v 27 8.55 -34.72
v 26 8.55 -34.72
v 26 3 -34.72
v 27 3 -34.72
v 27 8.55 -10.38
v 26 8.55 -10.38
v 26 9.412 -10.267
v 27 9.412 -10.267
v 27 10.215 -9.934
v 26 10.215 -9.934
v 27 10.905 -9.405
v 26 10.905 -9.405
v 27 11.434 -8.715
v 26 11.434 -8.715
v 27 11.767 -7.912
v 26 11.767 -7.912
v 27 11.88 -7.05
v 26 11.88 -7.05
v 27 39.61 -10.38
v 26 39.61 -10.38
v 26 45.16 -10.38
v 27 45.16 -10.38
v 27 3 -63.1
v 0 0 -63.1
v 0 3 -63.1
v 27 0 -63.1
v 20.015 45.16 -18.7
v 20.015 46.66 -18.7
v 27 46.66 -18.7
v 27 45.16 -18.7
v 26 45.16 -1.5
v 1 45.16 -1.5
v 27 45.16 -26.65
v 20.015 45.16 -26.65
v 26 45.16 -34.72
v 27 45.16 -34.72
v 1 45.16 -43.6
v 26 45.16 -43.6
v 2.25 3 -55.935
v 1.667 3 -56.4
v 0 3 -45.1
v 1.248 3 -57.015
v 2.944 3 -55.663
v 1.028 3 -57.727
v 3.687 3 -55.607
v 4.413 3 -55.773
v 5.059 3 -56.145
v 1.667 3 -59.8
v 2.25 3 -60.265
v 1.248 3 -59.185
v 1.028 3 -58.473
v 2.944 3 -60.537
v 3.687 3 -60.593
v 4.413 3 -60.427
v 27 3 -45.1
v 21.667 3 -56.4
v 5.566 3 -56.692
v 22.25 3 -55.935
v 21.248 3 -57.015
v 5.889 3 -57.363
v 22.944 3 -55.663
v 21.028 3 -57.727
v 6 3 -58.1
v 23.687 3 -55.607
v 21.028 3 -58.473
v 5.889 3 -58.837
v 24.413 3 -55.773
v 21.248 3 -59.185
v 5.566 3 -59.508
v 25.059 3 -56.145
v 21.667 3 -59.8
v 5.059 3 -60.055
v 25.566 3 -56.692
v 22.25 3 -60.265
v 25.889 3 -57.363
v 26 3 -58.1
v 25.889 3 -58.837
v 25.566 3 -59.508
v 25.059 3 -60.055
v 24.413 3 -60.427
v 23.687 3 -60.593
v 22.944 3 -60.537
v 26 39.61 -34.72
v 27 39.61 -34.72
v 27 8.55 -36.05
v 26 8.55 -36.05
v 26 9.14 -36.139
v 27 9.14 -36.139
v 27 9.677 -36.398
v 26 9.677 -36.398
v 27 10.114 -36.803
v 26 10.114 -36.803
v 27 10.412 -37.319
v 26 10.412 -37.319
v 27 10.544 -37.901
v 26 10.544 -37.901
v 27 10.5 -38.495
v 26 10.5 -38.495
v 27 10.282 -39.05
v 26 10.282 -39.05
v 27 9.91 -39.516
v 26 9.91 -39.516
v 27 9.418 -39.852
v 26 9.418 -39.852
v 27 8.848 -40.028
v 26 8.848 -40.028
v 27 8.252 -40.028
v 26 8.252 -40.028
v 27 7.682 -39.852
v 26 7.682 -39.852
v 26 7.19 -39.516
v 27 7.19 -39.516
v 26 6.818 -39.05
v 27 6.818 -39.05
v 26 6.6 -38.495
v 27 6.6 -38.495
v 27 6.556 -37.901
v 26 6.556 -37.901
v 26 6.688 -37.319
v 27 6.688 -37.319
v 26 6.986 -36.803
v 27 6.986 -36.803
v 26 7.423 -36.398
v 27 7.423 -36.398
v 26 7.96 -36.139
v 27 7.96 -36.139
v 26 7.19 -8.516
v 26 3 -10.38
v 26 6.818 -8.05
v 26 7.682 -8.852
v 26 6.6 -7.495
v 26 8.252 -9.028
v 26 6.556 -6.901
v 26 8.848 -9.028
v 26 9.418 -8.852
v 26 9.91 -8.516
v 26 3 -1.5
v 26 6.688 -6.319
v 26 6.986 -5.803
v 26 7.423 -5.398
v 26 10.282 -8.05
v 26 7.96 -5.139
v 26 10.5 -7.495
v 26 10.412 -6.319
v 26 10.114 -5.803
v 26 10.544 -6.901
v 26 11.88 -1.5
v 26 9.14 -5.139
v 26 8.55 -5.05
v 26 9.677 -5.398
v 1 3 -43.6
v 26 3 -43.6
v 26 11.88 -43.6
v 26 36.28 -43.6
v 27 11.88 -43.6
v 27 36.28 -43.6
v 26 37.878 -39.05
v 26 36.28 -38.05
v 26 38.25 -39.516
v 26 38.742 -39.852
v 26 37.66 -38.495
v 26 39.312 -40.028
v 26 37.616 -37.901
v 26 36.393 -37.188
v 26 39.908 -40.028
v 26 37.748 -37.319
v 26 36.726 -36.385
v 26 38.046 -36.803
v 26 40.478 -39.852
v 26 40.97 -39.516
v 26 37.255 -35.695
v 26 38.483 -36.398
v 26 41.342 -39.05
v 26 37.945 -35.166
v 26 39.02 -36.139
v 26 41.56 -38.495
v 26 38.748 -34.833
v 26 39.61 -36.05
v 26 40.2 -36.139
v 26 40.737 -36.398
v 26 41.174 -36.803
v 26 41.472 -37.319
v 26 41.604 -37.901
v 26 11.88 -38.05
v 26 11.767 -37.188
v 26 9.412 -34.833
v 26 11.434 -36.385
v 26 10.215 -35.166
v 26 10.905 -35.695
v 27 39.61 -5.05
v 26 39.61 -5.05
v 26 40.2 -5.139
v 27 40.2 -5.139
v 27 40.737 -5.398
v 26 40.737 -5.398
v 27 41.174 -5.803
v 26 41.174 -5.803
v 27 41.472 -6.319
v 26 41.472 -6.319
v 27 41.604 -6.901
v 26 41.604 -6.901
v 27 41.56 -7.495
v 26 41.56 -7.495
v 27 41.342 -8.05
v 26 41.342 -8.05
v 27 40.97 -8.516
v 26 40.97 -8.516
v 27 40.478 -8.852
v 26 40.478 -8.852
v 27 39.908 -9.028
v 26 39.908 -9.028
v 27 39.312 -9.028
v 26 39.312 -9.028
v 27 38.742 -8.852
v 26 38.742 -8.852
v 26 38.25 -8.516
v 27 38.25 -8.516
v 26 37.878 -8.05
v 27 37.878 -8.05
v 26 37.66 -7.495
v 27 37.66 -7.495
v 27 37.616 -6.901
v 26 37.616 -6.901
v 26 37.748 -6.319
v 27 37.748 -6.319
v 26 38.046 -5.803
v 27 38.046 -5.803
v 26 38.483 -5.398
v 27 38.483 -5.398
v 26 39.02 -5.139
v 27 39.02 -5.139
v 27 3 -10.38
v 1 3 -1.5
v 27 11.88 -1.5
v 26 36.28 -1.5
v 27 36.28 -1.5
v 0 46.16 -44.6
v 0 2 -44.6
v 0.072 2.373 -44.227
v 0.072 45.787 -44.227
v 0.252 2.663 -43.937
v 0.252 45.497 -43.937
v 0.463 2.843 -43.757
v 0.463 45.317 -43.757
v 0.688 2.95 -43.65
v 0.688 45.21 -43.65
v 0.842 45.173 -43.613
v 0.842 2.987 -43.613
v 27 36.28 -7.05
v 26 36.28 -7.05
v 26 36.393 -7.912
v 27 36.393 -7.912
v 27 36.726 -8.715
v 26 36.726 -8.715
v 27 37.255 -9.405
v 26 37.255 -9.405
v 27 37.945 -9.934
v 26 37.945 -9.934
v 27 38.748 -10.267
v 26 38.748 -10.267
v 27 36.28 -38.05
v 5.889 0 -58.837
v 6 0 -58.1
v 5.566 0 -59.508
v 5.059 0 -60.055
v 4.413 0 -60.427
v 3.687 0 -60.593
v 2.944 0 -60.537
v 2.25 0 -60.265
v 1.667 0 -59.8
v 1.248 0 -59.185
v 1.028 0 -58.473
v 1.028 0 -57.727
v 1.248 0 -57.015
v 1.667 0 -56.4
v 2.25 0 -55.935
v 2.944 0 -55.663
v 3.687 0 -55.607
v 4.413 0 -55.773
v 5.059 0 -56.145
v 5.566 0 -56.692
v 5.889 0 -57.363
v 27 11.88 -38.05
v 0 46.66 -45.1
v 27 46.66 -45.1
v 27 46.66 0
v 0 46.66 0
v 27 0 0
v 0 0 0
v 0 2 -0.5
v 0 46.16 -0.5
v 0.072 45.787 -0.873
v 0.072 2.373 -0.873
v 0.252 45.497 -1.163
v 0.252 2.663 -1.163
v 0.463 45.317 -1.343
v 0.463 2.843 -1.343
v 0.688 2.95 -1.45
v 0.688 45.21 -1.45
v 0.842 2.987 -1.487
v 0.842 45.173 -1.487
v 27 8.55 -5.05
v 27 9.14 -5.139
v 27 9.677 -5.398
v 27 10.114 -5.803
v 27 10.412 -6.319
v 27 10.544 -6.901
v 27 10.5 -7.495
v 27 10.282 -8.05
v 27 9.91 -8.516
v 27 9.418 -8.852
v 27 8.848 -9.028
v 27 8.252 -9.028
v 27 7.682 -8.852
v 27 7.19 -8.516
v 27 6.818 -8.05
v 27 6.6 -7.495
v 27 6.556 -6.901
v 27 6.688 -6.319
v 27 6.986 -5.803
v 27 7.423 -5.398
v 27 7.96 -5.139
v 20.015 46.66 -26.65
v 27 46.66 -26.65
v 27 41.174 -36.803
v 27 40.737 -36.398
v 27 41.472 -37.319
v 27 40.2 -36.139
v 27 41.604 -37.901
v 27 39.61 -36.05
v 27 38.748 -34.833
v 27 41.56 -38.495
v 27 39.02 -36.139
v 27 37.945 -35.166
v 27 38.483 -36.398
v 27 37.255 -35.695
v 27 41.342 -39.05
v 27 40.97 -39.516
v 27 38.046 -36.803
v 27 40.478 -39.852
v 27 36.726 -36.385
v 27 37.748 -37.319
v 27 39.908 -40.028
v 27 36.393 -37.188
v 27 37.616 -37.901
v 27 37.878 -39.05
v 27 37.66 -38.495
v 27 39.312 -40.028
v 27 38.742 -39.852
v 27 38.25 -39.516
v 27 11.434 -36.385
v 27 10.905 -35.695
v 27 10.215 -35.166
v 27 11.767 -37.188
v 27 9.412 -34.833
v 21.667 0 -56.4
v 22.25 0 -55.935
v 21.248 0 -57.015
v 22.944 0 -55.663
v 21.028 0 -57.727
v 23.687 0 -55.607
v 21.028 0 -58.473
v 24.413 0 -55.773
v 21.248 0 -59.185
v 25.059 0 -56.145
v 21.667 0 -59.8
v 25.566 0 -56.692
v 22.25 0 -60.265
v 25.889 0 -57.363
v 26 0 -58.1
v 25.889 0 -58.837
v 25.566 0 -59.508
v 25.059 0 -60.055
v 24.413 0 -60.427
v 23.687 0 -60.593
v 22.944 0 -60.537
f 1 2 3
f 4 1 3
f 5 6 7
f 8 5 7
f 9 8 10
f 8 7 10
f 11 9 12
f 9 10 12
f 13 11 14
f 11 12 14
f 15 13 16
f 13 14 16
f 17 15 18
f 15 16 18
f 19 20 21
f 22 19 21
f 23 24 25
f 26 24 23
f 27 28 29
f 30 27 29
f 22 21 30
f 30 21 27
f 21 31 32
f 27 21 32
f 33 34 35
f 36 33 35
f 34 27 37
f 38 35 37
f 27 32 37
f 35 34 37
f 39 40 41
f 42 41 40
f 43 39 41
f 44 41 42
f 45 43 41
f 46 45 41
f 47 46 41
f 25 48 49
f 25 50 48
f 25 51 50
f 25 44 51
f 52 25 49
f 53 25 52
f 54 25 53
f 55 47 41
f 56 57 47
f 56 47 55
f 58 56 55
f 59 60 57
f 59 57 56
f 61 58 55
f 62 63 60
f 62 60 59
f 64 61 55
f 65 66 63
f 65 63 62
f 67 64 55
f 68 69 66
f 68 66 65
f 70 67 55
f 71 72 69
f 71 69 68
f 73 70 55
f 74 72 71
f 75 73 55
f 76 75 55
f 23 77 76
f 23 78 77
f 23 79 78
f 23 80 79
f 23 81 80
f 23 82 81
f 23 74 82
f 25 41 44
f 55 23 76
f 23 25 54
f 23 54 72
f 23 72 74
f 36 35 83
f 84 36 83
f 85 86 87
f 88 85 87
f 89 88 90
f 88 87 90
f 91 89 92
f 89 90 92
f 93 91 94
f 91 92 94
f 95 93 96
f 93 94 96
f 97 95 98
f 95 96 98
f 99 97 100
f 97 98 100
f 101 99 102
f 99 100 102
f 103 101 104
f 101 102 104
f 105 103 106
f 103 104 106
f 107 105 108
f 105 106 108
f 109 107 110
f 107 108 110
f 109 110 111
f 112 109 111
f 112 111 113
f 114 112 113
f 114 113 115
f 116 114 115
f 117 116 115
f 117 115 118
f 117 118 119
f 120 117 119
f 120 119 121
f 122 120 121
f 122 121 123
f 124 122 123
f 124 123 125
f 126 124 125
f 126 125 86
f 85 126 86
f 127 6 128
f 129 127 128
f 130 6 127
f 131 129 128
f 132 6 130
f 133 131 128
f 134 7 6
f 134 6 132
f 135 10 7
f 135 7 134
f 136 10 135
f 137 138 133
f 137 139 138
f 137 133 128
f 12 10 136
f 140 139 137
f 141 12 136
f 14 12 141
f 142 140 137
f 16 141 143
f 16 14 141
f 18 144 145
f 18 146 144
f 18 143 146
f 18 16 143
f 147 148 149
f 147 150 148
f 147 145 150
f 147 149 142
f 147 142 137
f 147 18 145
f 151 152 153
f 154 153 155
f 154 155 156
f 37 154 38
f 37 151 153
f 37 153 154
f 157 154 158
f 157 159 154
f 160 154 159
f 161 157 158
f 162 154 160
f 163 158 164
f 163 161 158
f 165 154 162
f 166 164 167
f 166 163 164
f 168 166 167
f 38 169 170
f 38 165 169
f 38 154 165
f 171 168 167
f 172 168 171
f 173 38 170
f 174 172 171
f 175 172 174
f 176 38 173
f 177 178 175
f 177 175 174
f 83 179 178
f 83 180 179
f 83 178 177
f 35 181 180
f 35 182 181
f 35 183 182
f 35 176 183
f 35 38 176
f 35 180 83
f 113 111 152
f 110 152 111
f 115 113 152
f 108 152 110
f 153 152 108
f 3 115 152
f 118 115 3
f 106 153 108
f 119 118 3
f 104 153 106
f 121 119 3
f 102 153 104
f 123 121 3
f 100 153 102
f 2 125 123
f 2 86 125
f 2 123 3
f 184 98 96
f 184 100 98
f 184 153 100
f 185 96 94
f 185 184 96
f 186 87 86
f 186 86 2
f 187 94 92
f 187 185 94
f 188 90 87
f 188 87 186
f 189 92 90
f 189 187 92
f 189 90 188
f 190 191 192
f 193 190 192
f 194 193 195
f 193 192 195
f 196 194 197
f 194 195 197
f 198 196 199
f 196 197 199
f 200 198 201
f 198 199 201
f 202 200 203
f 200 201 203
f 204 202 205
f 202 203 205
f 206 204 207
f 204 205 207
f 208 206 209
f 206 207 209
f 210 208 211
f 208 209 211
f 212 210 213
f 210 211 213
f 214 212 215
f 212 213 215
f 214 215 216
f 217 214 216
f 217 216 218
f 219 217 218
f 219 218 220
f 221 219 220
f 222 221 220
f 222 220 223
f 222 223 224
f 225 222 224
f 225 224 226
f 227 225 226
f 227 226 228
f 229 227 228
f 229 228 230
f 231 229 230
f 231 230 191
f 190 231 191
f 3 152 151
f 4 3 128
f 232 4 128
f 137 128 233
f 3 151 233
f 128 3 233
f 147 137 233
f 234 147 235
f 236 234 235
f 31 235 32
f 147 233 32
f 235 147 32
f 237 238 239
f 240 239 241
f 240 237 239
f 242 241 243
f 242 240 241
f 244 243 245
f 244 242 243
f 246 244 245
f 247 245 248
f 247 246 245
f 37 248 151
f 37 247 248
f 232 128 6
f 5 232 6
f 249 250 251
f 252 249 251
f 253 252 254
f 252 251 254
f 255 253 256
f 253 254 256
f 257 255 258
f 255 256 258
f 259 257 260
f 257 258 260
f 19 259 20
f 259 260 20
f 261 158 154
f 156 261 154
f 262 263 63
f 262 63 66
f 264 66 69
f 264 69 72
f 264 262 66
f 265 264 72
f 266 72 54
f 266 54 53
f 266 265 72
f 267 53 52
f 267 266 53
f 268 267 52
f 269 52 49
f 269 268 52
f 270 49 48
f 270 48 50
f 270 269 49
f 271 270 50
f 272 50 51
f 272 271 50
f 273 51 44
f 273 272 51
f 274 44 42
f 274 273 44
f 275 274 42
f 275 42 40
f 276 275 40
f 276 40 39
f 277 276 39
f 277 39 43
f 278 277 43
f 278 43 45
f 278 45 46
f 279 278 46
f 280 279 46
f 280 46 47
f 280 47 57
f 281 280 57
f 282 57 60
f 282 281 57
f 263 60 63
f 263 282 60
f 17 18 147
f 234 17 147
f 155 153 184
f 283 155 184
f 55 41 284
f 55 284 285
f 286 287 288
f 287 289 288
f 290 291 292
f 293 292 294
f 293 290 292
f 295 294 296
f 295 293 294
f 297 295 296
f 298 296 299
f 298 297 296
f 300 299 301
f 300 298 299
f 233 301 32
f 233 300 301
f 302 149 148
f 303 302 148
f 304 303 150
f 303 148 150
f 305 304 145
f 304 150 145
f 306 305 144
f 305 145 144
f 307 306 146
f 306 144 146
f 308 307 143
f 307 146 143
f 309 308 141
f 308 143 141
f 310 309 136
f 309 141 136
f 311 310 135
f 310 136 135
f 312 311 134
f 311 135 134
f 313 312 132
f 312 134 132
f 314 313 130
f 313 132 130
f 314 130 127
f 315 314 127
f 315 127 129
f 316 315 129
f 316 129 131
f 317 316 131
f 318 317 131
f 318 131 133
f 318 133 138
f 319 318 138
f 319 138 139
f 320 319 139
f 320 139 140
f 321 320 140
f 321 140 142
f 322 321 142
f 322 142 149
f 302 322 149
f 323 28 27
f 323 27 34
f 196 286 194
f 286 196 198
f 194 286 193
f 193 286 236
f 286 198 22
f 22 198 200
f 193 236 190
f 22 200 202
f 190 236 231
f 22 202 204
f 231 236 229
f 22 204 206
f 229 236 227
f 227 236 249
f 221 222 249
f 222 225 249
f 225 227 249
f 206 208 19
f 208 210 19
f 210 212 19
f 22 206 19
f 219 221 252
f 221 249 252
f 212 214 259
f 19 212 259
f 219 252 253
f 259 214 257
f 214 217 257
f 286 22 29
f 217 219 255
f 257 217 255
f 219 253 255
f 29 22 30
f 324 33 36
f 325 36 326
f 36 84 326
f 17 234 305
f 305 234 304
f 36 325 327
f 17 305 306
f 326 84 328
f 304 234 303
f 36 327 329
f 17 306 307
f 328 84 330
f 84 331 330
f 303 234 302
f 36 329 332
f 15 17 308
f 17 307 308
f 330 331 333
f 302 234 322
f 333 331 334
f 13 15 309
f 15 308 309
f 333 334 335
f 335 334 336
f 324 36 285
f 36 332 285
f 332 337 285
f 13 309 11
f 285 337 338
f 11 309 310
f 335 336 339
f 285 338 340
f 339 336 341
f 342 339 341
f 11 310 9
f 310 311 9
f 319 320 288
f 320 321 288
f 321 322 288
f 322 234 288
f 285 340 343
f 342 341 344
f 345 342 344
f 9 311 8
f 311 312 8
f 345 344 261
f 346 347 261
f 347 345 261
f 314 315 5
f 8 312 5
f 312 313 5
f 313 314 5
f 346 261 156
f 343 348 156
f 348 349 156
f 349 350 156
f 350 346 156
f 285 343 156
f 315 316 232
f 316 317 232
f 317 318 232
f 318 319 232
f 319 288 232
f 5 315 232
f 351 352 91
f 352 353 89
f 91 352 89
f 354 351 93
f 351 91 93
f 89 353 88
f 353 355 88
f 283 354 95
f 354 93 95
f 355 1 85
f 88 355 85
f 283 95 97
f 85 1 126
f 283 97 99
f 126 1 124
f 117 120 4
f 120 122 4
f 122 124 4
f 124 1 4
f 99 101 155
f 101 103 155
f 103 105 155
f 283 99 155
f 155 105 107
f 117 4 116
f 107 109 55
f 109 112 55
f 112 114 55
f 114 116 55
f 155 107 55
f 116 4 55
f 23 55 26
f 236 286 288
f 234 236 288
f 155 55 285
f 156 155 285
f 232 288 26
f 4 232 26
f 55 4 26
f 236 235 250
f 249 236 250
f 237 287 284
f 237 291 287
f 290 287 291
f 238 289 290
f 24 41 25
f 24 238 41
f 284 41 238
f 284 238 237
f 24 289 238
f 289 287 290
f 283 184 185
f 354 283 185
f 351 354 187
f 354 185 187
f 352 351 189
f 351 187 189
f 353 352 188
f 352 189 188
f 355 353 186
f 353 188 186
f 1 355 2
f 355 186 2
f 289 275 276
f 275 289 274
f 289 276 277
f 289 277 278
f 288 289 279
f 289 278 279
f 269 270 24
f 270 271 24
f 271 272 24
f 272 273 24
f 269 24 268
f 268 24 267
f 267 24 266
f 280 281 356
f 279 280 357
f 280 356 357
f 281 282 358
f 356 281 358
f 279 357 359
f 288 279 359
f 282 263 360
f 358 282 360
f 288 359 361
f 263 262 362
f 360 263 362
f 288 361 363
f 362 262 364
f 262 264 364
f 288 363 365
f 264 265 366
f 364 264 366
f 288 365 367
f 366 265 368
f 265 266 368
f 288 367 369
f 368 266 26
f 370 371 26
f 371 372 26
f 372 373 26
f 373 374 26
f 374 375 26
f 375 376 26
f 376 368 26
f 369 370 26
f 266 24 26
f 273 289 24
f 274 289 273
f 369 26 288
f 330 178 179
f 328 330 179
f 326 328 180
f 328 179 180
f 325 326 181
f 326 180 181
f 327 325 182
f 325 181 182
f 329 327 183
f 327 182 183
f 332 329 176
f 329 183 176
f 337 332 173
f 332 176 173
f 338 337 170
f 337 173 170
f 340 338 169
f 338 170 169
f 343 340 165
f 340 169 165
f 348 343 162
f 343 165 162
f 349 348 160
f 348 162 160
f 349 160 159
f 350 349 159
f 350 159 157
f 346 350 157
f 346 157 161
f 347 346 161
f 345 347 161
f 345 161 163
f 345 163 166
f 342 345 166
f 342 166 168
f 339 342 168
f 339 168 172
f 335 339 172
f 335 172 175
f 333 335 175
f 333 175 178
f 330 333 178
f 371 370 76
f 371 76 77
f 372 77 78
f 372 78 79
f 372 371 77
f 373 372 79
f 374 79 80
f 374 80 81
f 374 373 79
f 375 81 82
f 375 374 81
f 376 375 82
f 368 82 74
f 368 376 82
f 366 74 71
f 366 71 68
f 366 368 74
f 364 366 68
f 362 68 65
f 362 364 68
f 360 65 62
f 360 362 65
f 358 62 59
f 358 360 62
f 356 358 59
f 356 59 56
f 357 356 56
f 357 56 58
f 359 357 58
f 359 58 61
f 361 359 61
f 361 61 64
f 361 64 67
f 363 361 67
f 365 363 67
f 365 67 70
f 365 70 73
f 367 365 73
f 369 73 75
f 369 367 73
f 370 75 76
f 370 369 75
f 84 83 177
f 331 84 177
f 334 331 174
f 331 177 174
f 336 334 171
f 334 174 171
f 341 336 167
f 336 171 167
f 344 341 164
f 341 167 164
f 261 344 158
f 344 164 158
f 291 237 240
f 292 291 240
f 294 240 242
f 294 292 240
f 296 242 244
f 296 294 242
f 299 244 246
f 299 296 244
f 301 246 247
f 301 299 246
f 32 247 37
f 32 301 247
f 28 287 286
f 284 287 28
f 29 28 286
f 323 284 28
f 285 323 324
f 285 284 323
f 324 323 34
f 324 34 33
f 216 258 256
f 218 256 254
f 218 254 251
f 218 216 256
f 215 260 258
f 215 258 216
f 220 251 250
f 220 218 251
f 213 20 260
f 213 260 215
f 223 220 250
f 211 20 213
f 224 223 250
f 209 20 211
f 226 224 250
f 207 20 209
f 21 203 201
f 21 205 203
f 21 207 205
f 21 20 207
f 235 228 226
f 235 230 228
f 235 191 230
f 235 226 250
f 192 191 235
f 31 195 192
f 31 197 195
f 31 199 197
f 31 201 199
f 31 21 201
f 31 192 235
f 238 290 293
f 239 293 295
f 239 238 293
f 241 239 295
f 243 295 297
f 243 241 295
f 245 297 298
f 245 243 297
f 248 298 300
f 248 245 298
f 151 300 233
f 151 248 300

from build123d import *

# Parameters (mm, degrees)
SKETCH1_W           = 27
SKETCH1_H           = 63.1
SKETCH1_R           = 2.5
BOSS_EXTRUDE1_DEPTH = 3
SKETCH2_W           = 27
SKETCH2_H           = 45.1
BOSS_EXTRUDE2_DEPTH = 43.66
CUT_EXTRUDE1_DEPTH  = 28
SKETCH3_8_W         = 42.1
SKETCH3_8_H         = 42.16
SKETCH3_8_R         = 2
CUT_EXTRUDE2_DEPTH  = 26
FILLET4_R           = 1
SKETCH6_W           = 6.985
SKETCH6_H           = 7.95
CUT_EXTRUDE3_DEPTH  = 1.5
SKETCH3_9_R         = 2
CUT_EXTRUDE4_DEPTH  = 28


with BuildPart() as part:
    # Sketch1 → Boss-Extrude1 (new body)
    with BuildSketch(Plane(origin=(0, 0, 0), x_dir=(1, 0, 0), z_dir=(0, 1, 0))):
        with Locations((13.5, 31.55)):
            Rectangle(SKETCH1_W, SKETCH1_H)
        with Locations((3.5, 58.1)):
            Circle(SKETCH1_R, mode=Mode.SUBTRACT)
        with Locations((23.5, 58.1)):
            Circle(SKETCH1_R, mode=Mode.SUBTRACT)
    extrude(amount=BOSS_EXTRUDE1_DEPTH)

    # Sketch2 → Boss-Extrude2 (add)
    with BuildSketch(Plane(origin=(0, 3, 0), x_dir=(1, 0, 0), z_dir=(0, 1, 0))):
        with Locations((13.5, 22.55)):
            Rectangle(SKETCH2_W, SKETCH2_H)
    extrude(amount=BOSS_EXTRUDE2_DEPTH)

    # Sketch3 → Cut-Extrude1 (cut, through all)
    with BuildSketch(Plane.ZY):
        with BuildLine():
            Line((-10.38, 45.16), (-34.72, 45.16))
            Line((-34.72, 45.16), (-34.72, 39.61))
            ThreePointArc((-34.72, 39.61), (-35.695334419, 37.255334419), (-38.05, 36.28))
            Line((-38.05, 36.28), (-43.6, 36.28))
            Line((-43.6, 36.28), (-43.6, 11.88))
            Line((-43.6, 11.88), (-38.05, 11.88))
            ThreePointArc((-38.05, 11.88), (-35.695334419, 10.904665581), (-34.72, 8.55))
            Line((-34.72, 8.55), (-34.72, 3))
            Line((-34.72, 3), (-10.38, 3))
            Line((-10.38, 3), (-10.38, 8.55))
            ThreePointArc((-10.38, 8.55), (-9.404665581, 10.904665581), (-7.05, 11.88))
            Line((-7.05, 11.88), (-1.5, 11.88))
            Line((-1.5, 11.88), (-1.5, 36.28))
            Line((-1.5, 36.28), (-7.05, 36.28))
            ThreePointArc((-7.05, 36.28), (-9.404665581, 37.255334419), (-10.38, 39.61))
            Line((-10.38, 39.61), (-10.38, 45.16))
        make_face()
    extrude(amount=-CUT_EXTRUDE1_DEPTH, mode=Mode.SUBTRACT)

    # Sketch3<8> → Cut-Extrude2 (cut)
    with BuildSketch(Plane.ZY):
        with Locations((-22.55, 24.08)):
            Rectangle(SKETCH3_8_W, SKETCH3_8_H)
        with Locations((-38.05, 8.55)):
            Circle(SKETCH3_8_R, mode=Mode.SUBTRACT)
        with Locations((-7.05, 39.61)):
            Circle(SKETCH3_8_R, mode=Mode.SUBTRACT)
        with Locations((-7.05, 8.55)):
            Circle(SKETCH3_8_R, mode=Mode.SUBTRACT)
        with Locations((-38.05, 39.61)):
            Circle(SKETCH3_8_R, mode=Mode.SUBTRACT)
    extrude(amount=-CUT_EXTRUDE2_DEPTH, mode=Mode.SUBTRACT)

    # Fillet4
    fillet4_edges = [part.edges().sort_by_distance(p)[0] for p in [
        (0, 45.16, -22.55),
        (0, 24.08, -1.5),
        (0, 3, -22.55),
        (0, 24.08, -43.6),
    ]]
    fillet(fillet4_edges, radius=FILLET4_R)

    # Sketch6 → Cut-Extrude3 (cut)
    with BuildSketch(Plane(origin=(0, 46.66, 0), x_dir=(1, 0, 0), z_dir=(0, 1, 0))):
        with Locations((23.5075, 22.675)):
            Rectangle(SKETCH6_W, SKETCH6_H)
    extrude(amount=-CUT_EXTRUDE3_DEPTH, mode=Mode.SUBTRACT)

    # Sketch3<9> → Cut-Extrude4 (cut, through all)
    with BuildSketch(Plane.ZY):
        with Locations((-38.05, 39.61)):
            Circle(SKETCH3_9_R)
        with Locations((-7.05, 39.61)):
            Circle(SKETCH3_9_R)
        with Locations((-7.05, 8.55)):
            Circle(SKETCH3_9_R)
        with Locations((-38.05, 8.55)):
            Circle(SKETCH3_9_R)
    extrude(amount=-CUT_EXTRUDE4_DEPTH, mode=Mode.SUBTRACT)


solid = part.part
